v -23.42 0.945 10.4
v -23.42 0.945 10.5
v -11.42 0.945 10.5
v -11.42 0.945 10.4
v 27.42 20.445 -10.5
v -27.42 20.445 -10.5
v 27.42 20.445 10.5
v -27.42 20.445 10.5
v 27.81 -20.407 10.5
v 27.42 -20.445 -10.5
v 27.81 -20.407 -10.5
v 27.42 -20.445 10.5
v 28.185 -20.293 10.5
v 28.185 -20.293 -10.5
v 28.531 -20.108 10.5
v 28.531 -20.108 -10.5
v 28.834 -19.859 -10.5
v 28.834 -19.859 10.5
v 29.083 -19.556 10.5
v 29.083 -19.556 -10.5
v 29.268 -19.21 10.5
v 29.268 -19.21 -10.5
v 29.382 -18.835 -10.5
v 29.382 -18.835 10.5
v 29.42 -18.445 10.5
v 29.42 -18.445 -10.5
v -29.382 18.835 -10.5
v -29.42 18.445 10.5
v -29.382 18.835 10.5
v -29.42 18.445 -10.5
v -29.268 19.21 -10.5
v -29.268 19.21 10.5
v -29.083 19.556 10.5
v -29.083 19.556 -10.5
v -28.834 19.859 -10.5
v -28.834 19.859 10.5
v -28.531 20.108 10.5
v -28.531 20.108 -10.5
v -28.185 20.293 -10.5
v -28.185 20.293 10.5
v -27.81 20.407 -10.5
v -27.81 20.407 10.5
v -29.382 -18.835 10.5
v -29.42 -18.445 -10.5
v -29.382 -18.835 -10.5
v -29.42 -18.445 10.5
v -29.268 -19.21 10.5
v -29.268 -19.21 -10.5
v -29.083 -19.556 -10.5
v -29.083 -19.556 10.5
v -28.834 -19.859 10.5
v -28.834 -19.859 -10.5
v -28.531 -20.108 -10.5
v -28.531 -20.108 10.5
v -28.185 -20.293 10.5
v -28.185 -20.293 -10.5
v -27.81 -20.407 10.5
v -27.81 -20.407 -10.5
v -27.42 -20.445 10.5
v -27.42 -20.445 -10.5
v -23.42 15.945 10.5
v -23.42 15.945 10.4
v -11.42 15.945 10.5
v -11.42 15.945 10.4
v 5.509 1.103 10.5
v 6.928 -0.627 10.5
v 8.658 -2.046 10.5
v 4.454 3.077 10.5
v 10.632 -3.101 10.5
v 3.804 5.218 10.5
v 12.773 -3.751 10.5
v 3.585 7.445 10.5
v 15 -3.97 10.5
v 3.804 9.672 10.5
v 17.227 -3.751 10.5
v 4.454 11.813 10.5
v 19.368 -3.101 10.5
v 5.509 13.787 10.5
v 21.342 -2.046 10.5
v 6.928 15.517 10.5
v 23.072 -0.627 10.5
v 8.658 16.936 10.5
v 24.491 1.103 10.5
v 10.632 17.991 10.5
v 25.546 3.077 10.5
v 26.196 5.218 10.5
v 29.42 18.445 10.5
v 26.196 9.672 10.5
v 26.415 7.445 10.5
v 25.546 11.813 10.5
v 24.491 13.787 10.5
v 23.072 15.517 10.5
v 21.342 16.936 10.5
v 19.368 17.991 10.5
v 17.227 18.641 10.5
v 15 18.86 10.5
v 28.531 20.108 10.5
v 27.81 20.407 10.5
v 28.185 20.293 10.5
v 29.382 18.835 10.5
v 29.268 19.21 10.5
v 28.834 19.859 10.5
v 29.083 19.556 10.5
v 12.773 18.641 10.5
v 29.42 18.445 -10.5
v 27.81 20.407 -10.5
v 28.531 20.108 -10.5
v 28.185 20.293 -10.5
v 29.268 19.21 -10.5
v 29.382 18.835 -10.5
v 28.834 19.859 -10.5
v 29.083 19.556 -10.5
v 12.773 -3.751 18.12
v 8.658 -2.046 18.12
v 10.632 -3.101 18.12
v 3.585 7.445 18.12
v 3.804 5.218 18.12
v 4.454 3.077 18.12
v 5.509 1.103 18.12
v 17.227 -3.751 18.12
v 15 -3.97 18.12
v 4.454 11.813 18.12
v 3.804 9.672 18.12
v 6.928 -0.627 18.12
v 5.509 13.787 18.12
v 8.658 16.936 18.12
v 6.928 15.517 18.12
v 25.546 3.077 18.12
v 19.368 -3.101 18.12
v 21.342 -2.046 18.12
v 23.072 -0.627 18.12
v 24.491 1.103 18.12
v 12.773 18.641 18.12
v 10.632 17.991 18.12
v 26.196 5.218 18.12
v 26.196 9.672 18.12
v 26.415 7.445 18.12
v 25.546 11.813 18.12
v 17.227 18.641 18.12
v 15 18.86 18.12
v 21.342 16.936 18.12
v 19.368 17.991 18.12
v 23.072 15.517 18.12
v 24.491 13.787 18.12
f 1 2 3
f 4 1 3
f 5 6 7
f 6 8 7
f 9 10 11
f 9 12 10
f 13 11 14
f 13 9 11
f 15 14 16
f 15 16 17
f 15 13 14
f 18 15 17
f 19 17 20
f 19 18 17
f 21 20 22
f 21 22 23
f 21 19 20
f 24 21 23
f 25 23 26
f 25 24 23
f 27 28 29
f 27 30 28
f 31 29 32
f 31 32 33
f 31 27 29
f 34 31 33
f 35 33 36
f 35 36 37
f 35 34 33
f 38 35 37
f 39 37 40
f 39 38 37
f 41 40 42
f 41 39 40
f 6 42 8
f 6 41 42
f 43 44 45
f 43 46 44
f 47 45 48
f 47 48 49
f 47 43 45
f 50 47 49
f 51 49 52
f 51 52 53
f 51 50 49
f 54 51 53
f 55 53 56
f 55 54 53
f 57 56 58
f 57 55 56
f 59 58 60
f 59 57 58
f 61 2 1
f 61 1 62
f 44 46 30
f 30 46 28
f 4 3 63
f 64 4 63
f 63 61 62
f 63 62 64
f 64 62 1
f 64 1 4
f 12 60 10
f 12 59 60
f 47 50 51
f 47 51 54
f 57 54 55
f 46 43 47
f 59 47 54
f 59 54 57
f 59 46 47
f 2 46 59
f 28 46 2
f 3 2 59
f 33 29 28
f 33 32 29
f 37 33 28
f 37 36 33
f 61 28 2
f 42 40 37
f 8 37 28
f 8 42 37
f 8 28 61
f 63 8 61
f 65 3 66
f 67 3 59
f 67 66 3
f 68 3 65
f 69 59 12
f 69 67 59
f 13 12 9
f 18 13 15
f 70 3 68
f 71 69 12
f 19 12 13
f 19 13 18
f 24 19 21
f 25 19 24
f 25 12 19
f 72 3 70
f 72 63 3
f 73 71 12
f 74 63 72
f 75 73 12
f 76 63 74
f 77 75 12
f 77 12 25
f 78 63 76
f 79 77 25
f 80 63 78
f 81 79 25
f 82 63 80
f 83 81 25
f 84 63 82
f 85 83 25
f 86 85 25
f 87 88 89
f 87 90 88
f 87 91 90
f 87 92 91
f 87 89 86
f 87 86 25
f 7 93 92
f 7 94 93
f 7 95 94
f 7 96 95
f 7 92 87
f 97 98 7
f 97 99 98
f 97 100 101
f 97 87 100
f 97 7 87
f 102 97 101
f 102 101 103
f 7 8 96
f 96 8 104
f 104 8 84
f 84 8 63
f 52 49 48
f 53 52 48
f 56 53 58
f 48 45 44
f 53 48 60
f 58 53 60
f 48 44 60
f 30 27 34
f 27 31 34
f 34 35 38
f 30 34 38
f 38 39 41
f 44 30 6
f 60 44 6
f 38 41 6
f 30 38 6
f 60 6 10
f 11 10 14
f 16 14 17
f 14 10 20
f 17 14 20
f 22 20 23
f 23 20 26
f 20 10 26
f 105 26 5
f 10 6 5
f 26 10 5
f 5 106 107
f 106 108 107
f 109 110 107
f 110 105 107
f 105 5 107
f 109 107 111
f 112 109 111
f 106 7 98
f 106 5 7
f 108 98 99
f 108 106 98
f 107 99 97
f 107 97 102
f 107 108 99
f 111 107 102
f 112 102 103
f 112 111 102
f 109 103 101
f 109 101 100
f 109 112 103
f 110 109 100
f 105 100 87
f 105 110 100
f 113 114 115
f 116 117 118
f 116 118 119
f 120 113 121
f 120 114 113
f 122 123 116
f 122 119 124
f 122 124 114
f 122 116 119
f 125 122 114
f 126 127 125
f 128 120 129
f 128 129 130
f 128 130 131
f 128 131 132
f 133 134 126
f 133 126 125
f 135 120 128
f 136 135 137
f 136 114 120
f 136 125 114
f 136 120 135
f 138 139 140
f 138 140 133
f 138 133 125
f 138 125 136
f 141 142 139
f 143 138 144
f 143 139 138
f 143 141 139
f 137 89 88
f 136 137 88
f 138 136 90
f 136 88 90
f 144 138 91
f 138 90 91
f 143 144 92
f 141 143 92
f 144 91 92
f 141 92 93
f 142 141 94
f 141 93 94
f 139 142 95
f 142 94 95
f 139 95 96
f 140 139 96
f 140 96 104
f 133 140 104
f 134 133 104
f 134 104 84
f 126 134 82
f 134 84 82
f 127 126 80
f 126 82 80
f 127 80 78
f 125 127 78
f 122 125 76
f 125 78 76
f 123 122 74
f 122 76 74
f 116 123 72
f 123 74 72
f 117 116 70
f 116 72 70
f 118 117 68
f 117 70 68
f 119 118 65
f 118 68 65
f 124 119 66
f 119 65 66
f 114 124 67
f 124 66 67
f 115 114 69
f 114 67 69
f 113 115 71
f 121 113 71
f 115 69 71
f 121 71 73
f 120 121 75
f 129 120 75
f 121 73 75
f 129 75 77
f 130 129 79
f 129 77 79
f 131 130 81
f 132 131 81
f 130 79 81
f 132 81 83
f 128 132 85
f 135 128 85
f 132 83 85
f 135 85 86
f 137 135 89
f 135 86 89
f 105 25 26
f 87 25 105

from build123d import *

# Parameters (mm, degrees)
SKETCH1_W           = 58.84
SKETCH1_H           = 40.89
BOSS_EXTRUDE1_DEPTH = 10.5
SKETCH2_R           = 11.415
BOSS_EXTRUDE2_DEPTH = 7.62
SKETCH4_W           = 12
SKETCH4_H           = 15
CUT_EXTRUDE1_DEPTH  = 0.1
FILLET1_R           = 2


with BuildPart() as part:
    # Sketch1 → Boss-Extrude1 (new body, symmetric)
    with BuildSketch(Plane.XY):
        Rectangle(SKETCH1_W, SKETCH1_H)
    extrude(amount=BOSS_EXTRUDE1_DEPTH, both=True)

    # Sketch2 → Boss-Extrude2 (add)
    with BuildSketch(Plane.XY.offset(10.5)):
        with Locations((15, 7.445)):
            Circle(SKETCH2_R)
    extrude(amount=BOSS_EXTRUDE2_DEPTH)

    # Sketch4 → Cut-Extrude1 (cut)
    with BuildSketch(Plane.XY.offset(10.5)):
        with Locations((-17.42, 8.445)):
            Rectangle(SKETCH4_W, SKETCH4_H)
    extrude(amount=-CUT_EXTRUDE1_DEPTH, mode=Mode.SUBTRACT)

    # Fillet1
    fillet1_edges = [part.edges().sort_by_distance(p)[0] for p in [
        (29.42, -20.445, 0),
        (-29.42, -20.445, 0),
        (-29.42, 20.445, 0),
        (29.42, 20.445, 0),
    ]]
    fillet(fillet1_edges, radius=FILLET1_R)


solid = part.part
